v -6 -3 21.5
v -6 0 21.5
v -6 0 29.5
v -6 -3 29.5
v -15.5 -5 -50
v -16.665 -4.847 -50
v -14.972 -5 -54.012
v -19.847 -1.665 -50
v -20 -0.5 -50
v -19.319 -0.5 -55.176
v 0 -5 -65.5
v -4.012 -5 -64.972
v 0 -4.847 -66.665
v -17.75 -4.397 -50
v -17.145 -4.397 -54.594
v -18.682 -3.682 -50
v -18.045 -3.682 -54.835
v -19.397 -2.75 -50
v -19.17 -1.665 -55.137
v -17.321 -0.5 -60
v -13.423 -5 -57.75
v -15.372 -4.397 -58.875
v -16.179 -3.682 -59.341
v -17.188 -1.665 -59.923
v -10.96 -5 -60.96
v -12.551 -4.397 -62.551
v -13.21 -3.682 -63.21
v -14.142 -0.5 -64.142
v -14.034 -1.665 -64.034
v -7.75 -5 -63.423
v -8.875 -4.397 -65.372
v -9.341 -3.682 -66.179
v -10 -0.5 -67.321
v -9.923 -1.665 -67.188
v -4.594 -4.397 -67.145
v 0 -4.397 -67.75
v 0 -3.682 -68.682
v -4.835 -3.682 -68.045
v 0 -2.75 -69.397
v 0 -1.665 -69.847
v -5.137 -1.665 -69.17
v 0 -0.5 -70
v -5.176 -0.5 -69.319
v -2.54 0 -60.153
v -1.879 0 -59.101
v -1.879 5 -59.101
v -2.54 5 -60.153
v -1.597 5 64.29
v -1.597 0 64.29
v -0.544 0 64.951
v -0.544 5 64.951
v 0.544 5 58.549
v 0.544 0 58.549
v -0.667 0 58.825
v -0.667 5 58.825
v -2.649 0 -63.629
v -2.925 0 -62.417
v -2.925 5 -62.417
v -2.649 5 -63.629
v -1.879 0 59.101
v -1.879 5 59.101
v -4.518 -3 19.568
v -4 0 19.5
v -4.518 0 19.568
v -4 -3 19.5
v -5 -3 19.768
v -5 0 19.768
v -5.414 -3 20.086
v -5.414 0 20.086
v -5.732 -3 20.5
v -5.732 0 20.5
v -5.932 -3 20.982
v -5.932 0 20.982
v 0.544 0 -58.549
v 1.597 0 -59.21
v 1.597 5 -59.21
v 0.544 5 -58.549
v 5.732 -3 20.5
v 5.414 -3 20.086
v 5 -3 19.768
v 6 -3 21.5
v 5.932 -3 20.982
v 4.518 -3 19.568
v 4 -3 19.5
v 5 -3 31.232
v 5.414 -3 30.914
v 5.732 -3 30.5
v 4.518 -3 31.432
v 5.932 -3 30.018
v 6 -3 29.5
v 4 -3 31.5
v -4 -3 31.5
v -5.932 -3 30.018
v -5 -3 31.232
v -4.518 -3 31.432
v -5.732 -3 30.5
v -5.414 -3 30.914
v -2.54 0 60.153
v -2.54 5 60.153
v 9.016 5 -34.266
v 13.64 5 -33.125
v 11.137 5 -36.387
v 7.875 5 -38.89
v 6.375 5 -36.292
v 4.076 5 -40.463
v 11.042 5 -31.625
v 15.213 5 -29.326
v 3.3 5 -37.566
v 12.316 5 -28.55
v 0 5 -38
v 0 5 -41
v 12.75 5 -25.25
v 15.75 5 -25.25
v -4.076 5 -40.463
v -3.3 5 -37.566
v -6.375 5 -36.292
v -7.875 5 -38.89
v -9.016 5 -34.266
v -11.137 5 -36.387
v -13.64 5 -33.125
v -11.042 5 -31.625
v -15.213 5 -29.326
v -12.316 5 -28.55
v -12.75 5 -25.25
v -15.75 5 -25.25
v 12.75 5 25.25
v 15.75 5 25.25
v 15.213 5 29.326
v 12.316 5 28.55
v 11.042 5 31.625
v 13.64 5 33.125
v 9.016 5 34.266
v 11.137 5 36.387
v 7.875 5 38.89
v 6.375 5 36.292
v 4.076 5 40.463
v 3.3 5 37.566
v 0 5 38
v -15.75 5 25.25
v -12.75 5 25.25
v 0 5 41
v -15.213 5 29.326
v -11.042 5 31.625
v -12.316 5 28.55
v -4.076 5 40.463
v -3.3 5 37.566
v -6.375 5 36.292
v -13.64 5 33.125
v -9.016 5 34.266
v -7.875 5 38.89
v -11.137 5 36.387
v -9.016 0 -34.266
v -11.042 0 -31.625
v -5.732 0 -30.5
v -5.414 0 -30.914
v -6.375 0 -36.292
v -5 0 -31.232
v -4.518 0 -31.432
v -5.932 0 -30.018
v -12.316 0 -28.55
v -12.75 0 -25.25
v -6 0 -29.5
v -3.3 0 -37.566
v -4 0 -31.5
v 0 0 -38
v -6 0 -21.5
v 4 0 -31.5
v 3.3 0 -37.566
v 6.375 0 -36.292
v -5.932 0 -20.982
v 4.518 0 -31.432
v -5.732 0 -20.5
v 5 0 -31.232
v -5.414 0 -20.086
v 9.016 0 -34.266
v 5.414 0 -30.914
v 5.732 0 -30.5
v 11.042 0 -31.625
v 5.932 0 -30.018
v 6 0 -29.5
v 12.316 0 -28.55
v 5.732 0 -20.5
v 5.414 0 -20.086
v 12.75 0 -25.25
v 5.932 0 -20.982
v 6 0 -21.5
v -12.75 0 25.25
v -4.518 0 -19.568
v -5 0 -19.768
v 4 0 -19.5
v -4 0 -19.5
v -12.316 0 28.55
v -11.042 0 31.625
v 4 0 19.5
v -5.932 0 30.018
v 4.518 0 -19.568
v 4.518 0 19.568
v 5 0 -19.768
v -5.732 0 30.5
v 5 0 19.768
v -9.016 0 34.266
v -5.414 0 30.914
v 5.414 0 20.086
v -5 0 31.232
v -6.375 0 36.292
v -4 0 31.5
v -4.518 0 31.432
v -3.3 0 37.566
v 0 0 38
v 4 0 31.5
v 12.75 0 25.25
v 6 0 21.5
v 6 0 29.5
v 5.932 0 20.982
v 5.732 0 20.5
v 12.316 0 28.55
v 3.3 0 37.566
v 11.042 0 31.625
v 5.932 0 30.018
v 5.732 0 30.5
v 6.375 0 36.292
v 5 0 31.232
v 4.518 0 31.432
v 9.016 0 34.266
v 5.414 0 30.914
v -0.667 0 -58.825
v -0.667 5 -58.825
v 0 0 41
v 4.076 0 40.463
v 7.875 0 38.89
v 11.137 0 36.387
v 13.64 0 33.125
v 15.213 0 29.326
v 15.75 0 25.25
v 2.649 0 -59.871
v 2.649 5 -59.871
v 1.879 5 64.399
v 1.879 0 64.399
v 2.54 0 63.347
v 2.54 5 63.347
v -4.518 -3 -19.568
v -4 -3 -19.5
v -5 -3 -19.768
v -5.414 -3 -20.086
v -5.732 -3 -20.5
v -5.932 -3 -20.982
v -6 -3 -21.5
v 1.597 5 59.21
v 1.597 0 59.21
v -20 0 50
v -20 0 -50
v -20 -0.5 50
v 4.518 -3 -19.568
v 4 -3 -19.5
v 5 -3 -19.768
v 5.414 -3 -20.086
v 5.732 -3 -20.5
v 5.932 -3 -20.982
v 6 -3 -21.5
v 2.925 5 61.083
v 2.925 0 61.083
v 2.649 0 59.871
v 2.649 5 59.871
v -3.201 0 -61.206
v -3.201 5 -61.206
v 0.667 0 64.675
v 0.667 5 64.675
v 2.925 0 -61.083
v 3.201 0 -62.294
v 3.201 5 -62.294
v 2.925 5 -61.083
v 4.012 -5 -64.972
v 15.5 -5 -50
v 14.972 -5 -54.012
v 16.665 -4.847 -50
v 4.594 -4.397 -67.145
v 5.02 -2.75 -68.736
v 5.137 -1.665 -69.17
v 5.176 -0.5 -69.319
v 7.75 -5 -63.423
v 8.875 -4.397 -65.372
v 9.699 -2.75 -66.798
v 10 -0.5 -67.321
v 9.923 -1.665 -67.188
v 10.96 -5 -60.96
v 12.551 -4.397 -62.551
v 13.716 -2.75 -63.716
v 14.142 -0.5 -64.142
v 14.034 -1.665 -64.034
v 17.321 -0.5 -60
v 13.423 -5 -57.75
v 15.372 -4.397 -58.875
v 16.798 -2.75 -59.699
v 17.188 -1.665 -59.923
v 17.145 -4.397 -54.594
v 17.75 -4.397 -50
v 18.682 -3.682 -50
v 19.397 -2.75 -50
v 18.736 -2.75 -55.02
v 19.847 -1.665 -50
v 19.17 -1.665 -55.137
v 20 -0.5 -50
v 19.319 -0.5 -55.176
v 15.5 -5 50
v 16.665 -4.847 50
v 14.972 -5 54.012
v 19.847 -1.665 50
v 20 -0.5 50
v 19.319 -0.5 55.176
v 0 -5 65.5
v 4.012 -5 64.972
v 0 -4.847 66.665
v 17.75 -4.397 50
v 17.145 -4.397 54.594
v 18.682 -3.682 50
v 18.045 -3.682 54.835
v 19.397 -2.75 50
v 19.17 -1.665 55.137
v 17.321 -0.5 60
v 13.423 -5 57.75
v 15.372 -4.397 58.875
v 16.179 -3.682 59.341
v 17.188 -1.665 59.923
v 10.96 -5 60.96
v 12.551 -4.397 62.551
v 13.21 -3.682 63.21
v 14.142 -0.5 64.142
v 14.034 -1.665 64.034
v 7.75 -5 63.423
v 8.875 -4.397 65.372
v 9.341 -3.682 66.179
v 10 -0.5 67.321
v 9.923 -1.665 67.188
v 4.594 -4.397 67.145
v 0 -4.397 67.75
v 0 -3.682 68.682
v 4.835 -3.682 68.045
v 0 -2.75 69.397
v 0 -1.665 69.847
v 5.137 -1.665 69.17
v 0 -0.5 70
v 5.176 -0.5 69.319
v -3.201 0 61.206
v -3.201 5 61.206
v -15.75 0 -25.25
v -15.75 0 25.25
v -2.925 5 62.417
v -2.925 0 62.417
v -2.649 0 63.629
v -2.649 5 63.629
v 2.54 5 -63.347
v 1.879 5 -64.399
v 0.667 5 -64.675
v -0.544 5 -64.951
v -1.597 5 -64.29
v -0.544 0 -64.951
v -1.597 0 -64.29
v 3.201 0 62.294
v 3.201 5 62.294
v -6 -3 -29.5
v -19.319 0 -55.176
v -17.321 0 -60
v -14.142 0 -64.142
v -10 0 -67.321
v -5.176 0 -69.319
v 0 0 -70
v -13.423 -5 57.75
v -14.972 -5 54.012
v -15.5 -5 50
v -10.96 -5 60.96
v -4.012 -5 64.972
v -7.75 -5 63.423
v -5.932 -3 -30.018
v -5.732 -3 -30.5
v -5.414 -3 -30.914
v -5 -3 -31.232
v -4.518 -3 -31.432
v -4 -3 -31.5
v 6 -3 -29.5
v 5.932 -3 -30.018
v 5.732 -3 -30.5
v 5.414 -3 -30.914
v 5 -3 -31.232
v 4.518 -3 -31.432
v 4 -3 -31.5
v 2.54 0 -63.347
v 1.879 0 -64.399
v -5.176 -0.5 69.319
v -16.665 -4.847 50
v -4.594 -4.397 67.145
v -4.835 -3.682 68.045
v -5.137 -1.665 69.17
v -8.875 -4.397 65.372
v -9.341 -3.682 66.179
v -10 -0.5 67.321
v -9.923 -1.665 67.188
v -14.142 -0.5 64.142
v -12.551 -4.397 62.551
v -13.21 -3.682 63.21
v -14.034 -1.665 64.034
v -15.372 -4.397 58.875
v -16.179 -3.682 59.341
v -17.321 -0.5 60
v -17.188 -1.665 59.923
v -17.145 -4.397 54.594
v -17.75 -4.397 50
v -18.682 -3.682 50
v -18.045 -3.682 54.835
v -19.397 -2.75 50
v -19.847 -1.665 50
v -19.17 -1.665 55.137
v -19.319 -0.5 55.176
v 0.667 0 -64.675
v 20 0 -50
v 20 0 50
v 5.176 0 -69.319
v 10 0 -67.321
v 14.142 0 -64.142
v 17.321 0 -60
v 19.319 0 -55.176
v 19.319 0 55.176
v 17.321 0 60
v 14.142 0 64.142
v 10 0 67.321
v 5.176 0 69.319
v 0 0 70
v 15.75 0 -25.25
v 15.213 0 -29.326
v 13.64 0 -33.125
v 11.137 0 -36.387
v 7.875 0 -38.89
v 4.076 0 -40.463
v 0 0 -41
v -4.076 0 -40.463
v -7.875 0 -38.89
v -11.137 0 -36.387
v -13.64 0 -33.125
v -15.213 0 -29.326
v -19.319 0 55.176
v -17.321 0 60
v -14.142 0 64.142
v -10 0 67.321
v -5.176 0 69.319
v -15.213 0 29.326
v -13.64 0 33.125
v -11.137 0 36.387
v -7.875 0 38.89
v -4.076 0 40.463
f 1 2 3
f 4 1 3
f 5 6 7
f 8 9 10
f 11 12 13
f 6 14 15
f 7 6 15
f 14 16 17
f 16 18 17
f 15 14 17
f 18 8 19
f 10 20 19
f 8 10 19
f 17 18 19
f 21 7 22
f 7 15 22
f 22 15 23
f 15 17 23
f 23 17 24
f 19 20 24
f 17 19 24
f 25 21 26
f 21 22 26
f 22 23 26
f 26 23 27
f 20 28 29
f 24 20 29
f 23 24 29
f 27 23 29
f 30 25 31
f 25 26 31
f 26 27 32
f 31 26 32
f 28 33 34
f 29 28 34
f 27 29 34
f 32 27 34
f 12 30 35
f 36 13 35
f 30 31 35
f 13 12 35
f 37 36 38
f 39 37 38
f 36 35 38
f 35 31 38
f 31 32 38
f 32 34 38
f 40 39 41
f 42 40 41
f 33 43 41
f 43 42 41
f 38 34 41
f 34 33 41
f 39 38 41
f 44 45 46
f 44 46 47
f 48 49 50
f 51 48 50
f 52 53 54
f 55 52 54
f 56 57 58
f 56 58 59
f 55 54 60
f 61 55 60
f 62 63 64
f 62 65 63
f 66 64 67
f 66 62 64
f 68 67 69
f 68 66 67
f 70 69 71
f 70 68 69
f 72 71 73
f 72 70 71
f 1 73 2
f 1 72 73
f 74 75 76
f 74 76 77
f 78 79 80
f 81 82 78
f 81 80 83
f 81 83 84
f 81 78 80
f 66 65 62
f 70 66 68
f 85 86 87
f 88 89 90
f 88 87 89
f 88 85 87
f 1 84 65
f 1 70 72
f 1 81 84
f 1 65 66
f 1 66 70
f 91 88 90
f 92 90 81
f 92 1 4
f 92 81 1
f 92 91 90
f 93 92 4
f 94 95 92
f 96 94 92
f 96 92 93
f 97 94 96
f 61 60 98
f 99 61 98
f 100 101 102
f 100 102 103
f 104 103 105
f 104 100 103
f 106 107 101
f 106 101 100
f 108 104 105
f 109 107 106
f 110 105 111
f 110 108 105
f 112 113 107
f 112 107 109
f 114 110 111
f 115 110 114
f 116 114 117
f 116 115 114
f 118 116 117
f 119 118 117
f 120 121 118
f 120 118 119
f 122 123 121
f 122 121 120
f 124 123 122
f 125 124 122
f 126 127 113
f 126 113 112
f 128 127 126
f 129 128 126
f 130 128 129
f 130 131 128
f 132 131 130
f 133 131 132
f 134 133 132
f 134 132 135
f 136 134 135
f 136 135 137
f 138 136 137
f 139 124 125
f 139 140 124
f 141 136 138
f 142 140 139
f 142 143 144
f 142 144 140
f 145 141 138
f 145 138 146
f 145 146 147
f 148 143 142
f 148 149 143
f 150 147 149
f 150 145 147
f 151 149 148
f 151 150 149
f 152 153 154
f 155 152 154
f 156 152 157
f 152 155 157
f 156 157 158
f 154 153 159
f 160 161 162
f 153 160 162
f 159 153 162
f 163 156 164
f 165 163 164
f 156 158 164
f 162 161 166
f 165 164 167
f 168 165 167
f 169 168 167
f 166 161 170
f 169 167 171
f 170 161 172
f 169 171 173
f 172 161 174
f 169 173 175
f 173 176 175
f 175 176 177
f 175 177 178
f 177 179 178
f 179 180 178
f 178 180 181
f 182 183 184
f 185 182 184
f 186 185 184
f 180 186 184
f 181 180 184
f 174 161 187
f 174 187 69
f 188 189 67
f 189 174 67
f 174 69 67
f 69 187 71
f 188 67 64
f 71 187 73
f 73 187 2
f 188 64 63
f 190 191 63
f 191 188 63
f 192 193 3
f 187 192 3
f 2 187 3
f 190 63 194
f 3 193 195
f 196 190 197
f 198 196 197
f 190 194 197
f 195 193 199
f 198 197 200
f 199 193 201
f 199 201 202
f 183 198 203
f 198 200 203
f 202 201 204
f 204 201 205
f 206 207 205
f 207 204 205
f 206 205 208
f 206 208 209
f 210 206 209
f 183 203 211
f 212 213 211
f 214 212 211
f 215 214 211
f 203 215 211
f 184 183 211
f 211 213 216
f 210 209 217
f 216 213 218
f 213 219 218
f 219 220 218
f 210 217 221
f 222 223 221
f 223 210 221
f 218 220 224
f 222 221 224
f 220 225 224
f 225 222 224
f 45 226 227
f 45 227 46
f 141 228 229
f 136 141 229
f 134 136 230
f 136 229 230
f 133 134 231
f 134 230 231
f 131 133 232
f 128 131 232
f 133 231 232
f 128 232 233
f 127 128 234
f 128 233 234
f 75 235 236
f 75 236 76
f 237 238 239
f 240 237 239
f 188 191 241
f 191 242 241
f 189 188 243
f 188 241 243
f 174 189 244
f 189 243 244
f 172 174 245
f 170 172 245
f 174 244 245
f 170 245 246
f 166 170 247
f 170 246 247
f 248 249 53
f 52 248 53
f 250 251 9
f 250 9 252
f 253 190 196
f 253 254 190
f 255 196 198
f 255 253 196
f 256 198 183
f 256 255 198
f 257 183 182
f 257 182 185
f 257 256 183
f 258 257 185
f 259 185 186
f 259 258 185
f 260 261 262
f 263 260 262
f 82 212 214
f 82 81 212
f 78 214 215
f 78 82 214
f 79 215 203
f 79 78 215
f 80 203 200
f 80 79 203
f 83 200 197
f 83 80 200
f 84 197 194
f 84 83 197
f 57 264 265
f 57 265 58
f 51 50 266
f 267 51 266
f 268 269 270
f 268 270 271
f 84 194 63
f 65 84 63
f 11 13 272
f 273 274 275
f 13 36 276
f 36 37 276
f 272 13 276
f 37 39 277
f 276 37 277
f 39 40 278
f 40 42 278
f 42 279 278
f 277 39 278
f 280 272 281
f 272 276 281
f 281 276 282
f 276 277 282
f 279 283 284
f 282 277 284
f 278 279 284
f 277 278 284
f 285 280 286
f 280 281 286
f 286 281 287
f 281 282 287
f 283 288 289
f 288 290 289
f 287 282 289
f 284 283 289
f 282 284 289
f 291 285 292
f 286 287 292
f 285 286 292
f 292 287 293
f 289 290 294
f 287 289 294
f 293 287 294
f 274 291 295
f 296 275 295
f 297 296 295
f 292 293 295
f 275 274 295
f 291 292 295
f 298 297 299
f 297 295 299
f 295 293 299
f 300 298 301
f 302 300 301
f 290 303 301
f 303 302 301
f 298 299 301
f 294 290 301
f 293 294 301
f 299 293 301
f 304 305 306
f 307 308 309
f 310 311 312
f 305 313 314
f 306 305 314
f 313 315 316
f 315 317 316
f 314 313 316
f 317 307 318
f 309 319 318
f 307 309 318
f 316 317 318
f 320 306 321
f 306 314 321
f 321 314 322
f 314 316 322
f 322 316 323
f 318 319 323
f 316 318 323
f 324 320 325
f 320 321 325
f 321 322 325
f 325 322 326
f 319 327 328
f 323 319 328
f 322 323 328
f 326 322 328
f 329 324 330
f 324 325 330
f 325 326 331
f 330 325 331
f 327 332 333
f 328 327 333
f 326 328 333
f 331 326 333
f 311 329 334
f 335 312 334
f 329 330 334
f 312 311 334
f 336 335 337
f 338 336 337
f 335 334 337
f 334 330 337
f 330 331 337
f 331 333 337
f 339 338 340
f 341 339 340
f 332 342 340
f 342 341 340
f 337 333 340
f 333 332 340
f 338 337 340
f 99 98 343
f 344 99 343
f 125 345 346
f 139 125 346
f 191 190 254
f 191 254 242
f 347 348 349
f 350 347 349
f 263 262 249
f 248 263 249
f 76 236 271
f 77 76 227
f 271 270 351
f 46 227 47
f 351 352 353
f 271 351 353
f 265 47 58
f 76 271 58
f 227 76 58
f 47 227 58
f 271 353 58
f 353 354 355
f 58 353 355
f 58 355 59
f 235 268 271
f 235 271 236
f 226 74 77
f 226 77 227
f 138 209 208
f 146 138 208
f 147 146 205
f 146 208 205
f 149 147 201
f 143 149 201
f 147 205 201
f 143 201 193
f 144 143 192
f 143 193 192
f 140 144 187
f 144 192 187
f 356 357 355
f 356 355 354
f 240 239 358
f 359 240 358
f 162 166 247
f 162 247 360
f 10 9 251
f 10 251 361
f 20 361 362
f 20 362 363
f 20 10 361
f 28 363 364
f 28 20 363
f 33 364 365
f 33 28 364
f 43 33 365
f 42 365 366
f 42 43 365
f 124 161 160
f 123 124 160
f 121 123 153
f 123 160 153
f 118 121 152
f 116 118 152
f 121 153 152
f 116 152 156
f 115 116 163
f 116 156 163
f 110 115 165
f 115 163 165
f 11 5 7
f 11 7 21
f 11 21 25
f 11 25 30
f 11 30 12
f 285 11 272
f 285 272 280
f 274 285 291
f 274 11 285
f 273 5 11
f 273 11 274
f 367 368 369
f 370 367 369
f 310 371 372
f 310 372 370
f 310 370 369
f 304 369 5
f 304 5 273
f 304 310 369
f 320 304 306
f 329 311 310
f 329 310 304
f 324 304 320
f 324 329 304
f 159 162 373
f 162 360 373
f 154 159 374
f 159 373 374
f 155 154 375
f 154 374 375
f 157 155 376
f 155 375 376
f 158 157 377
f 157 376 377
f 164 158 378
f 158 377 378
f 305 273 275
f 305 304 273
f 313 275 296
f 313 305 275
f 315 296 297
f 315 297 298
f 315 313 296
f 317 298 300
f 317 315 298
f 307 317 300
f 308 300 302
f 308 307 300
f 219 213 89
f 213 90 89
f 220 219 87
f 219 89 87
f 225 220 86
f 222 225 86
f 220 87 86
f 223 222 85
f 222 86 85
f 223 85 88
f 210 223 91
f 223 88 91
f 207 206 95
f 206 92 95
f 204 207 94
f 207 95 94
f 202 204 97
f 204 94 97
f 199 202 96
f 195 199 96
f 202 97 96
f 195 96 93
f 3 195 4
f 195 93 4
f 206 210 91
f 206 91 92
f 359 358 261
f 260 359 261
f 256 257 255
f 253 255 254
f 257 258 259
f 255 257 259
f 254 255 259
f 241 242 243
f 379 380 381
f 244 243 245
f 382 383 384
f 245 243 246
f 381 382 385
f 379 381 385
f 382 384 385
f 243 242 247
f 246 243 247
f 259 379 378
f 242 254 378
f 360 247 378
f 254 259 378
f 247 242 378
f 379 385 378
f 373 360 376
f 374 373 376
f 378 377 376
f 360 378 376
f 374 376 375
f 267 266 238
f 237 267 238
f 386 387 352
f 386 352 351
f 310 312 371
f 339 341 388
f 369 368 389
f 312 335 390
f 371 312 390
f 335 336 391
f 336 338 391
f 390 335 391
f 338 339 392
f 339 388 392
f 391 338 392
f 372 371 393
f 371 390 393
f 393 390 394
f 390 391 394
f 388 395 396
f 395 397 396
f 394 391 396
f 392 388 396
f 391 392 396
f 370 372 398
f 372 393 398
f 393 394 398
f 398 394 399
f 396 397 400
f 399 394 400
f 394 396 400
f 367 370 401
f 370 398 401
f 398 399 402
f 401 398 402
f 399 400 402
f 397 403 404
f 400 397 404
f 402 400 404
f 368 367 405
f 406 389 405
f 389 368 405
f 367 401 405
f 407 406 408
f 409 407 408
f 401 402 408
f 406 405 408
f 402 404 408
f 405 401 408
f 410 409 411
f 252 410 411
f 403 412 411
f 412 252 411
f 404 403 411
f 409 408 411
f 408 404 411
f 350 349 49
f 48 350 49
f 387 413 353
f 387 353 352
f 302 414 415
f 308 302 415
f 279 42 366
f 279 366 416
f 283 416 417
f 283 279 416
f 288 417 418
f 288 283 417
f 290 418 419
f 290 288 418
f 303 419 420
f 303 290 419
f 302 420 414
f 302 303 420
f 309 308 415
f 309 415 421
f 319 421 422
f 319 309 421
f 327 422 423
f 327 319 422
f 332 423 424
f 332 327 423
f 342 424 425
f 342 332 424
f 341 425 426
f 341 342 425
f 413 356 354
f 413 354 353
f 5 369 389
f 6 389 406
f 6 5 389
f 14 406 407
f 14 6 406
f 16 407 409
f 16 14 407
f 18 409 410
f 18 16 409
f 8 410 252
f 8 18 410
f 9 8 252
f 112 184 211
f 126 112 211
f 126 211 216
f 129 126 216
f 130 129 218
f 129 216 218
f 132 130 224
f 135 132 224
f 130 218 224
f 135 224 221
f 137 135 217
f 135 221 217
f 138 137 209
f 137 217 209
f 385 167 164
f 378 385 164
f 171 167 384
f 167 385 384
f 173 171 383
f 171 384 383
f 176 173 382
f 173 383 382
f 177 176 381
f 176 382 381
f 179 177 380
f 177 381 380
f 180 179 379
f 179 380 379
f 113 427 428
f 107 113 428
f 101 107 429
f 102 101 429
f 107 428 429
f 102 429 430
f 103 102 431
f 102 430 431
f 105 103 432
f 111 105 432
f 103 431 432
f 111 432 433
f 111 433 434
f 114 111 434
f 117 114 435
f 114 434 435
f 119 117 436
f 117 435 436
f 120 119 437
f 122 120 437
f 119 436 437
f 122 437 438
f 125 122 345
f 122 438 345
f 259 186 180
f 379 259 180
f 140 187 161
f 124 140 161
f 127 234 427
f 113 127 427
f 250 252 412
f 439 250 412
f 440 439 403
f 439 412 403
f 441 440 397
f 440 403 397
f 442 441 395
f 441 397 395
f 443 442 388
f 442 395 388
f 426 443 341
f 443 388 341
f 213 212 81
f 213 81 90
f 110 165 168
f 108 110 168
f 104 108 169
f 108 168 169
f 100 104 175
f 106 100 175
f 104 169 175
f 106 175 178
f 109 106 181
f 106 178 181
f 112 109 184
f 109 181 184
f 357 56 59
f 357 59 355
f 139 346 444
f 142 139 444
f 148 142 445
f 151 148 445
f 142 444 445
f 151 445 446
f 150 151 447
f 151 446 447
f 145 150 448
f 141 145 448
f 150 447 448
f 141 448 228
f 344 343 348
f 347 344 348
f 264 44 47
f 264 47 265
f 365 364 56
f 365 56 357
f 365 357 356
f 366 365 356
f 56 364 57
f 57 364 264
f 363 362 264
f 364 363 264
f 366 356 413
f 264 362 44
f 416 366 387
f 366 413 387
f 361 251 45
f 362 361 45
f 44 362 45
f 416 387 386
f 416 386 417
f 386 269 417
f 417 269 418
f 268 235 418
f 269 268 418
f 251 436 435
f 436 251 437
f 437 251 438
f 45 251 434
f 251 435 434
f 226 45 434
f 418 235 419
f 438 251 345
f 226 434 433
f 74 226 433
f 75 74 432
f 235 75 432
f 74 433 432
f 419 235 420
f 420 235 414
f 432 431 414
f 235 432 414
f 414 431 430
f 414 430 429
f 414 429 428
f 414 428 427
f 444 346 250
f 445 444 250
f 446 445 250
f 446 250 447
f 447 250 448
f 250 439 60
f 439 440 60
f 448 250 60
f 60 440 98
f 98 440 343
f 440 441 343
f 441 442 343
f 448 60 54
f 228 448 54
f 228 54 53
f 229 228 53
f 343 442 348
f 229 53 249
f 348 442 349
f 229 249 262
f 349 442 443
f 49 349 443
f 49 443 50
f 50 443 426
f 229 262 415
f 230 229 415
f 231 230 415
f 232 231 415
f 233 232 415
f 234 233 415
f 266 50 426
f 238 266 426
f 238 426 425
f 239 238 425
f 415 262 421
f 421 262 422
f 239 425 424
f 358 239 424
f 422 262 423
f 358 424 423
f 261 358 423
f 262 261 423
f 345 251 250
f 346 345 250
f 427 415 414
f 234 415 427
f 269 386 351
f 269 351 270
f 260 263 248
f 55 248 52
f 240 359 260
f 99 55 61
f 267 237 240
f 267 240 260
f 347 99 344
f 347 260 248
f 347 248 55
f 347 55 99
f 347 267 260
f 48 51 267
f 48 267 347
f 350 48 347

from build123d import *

# Parameters (mm, degrees)
F0_W      = 40
F0_H      = 140
F1_DEPTH  = 5
F2_R      = 19.99999
F3_R      = 4.5
F5_DEPTH  = 5
F6_W      = 12
F6_H      = 12
F7_DEPTH  = 3
F8_R      = 2
F10_DEPTH = 5


# Not quite as in the source:
# - a fillet or chamfer is up to 0.001 mm smaller than in the source, because OpenCascade refuses the exact size
# - a pattern or mirror of a feature is missing from the dataset's text; its kind, count and spacing are read off the source's solid


with BuildPart() as f1:
    # F0 (on Front) → F1 (new body)
    with BuildSketch(Plane.XZ):
        Rectangle(F0_W, F0_H)
    extrude(amount=F1_DEPTH)

    # F2 (radius 20 in the source; OpenCascade refuses exactly that, so slightly less here)
    f2_edges = [f1.edges().sort_by_distance(p)[0] for p in [
        (-20, -2.5, 70),
        (20, -2.5, 70),
        (20, -2.5, -70),
        (-20, -2.5, -70),
    ]]
    fillet(f2_edges, radius=F2_R)

    # F3
    f3_edges = [f1.edges().sort_by_distance(p)[0] for p in [
        (20, -5, 0),
        (0, -5, -70),
        (-14.142139, -5, -64.142139),
        (14.142139, -5, -64.142139),
        (-20, -5, 0),
        (-14.142139, -5, 64.142139),
        (14.142139, -5, 64.142139),
        (0, -5, 70),
    ]]
    fillet(f3_edges, radius=F3_R)

    # F4 (on face) → F5 (join)
    with BuildSketch(Plane(origin=(0, 0, 0), x_dir=(-1, 0, 0), z_dir=(0, 1, 0))):
        with BuildLine():
            ThreePointArc((2.5399159699, 60.1534954225), (2.8826851987, 60.9192617469), (3, 61.75))
            ThreePointArc((3, 61.75), (2.9811636084, 62.0856538989), (2.9248909734, 62.4170927923))
            ThreePointArc((2.9248909734, 62.4170927923), (2.4469615912, 63.48562063), (1.5965045374, 64.2899159951))
            ThreePointArc((1.5965045374, 64.2899159951), (0.5029940174, 64.7075322515), (-0.6670927923, 64.6748909734))
            ThreePointArc((-0.6670927923, 64.6748909734), (-1.7356206048, 64.1969616091), (-2.5399159621, 63.3465045899))
            ThreePointArc((-2.5399159621, 63.3465045899), (-2.9575322502, 62.2529940246), (-2.9248909629, 61.0829071616))
            ThreePointArc((-2.9248909629, 61.0829071616), (-2.4469615928, 60.0143793723), (-1.5965045824, 59.2100840332))
            ThreePointArc((-1.5965045824, 59.2100840332), (-0.5029939825, 58.7924677426), (0.6670929131, 58.8251090541))
            ThreePointArc((0.6670929131, 58.8251090541), (1.7356206613, 59.303038431), (2.5399159699, 60.1534954225))
        make_face()
        with BuildLine():
            ThreePointArc((2.9248909734, 62.4170927923), (2.9811636084, 62.0856538989), (3, 61.75))
            ThreePointArc((3, 61.75), (2.8826851987, 60.9192617469), (2.5399159699, 60.1534954225))
            Line((2.5399159699, 60.1534954225), (3.2012098578, 61.2055632972))
            Line((3.2012098578, 61.2055632972), (2.9248909734, 62.4170927923))
        make_face()
        with BuildLine():
            ThreePointArc((1.5965045374, 64.2899159951), (2.4469615912, 63.48562063), (2.9248909734, 62.4170927923))
            Line((2.9248909734, 62.4170927923), (2.648572083, 63.628622314))
            Line((2.648572083, 63.628622314), (1.5965045374, 64.2899159951))
        make_face()
        with BuildLine():
            Line((1.878622314, 59.101427917), (2.5399159699, 60.1534954225))
            ThreePointArc((2.5399159699, 60.1534954225), (1.7356206613, 59.303038431), (0.6670929131, 58.8251090541))
            Line((0.6670929131, 58.8251090541), (1.878622314, 59.101427917))
        make_face()
        with BuildLine():
            ThreePointArc((-0.6670927923, 64.6748909734), (0.5029940174, 64.7075322515), (1.5965045374, 64.2899159951))
            Line((1.5965045374, 64.2899159951), (0.5444367028, 64.9512098578))
            Line((0.5444367028, 64.9512098578), (-0.6670927923, 64.6748909734))
        make_face()
        with BuildLine():
            Line((-0.5444367028, 58.5487901422), (0.6670929131, 58.8251090541))
            ThreePointArc((0.6670929131, 58.8251090541), (-0.5029939825, 58.7924677426), (-1.5965045824, 59.2100840332))
            Line((-1.5965045824, 59.2100840332), (-0.5444367028, 58.5487901422))
        make_face()
        with BuildLine():
            ThreePointArc((-2.5399159621, 63.3465045899), (-1.7356206048, 64.1969616091), (-0.6670927923, 64.6748909734))
            Line((-0.6670927923, 64.6748909734), (-1.878622314, 64.398572083))
            Line((-1.878622314, 64.398572083), (-2.5399159621, 63.3465045899))
        make_face()
        with BuildLine():
            Line((-2.648572083, 59.871377686), (-1.5965045824, 59.2100840332))
            ThreePointArc((-1.5965045824, 59.2100840332), (-2.4469615928, 60.0143793723), (-2.9248909629, 61.0829071616))
            Line((-2.9248909629, 61.0829071616), (-2.648572083, 59.871377686))
        make_face()
        with BuildLine():
            ThreePointArc((-2.9248909629, 61.0829071616), (-2.9575322502, 62.2529940246), (-2.5399159621, 63.3465045899))
            Line((-2.5399159621, 63.3465045899), (-3.2012098578, 62.2944367028))
            Line((-3.2012098578, 62.2944367028), (-2.9248909629, 61.0829071616))
        make_face()
    f5 = extrude(amount=F5_DEPTH)

    # F5_copies: F5 across plane
    add(f5.mirror(Plane(origin=(0, 0, 0), x_dir=(-1, 0, 0), z_dir=(0, 0, -1))))

    # F6 (on face) → F7 (cut)
    with BuildSketch(Plane(origin=(0, 0, 0), x_dir=(-1, 0, 0), z_dir=(0, 1, 0))):
        with Locations((0, 25.5)):
            Rectangle(F6_W, F6_H)
    f7 = extrude(amount=-F7_DEPTH, mode=Mode.SUBTRACT)

    # F7_copies: F7 across plane
    add(f7.mirror(Plane(origin=(0, 0, 0), x_dir=(-1, 0, 0), z_dir=(0, 0, -1))), mode=Mode.SUBTRACT)

    # F8
    f8_edges = [f1.edges().sort_by_distance(p)[0] for p in [
        (6, -1.5, 31.5),
        (-6, -1.5, 31.5),
        (-6, -1.5, 19.5),
        (6, -1.5, 19.5),
        (6, -1.5, -19.5),
        (-6, -1.5, -19.5),
        (-6, -1.5, -31.5),
        (6, -1.5, -31.5),
    ]]
    fillet(f8_edges, radius=F8_R)

    # F9 (on face) → F10 (join)
    with BuildSketch(Plane(origin=(0, 0, 0), x_dir=(-1, 0, 0), z_dir=(0, 1, 0))):
        with BuildLine():
            ThreePointArc((0, -41), (11.1369318037, -36.3869318037), (15.75, -25.25))
            Line((15.75, -25.25), (15.75, 25.25))
            ThreePointArc((15.75, 25.25), (11.1369318037, 36.3869318037), (0, 41))
            ThreePointArc((0, 41), (-11.1369318037, 36.3869318037), (-15.75, 25.25))
            Line((-15.75, 25.25), (-15.75, -25.25))
            ThreePointArc((-15.75, -25.25), (-11.1369318037, -36.3869318037), (0, -41))
        make_face()
        with BuildLine():
            ThreePointArc((12.75, -25.25), (9.0156114601, -34.2656114601), (0, -38))
            ThreePointArc((0, -38), (-9.0156114601, -34.2656114601), (-12.75, -25.25))
            Line((-12.75, -25.25), (-12.75, 25.25))
            ThreePointArc((-12.75, 25.25), (-9.0156114601, 34.2656114601), (0, 38))
            ThreePointArc((0, 38), (9.0156114601, 34.2656114601), (12.75, 25.25))
            Line((12.75, 25.25), (12.75, -25.25))
        make_face(mode=Mode.SUBTRACT)
    extrude(amount=F10_DEPTH)


solid = f1.part
